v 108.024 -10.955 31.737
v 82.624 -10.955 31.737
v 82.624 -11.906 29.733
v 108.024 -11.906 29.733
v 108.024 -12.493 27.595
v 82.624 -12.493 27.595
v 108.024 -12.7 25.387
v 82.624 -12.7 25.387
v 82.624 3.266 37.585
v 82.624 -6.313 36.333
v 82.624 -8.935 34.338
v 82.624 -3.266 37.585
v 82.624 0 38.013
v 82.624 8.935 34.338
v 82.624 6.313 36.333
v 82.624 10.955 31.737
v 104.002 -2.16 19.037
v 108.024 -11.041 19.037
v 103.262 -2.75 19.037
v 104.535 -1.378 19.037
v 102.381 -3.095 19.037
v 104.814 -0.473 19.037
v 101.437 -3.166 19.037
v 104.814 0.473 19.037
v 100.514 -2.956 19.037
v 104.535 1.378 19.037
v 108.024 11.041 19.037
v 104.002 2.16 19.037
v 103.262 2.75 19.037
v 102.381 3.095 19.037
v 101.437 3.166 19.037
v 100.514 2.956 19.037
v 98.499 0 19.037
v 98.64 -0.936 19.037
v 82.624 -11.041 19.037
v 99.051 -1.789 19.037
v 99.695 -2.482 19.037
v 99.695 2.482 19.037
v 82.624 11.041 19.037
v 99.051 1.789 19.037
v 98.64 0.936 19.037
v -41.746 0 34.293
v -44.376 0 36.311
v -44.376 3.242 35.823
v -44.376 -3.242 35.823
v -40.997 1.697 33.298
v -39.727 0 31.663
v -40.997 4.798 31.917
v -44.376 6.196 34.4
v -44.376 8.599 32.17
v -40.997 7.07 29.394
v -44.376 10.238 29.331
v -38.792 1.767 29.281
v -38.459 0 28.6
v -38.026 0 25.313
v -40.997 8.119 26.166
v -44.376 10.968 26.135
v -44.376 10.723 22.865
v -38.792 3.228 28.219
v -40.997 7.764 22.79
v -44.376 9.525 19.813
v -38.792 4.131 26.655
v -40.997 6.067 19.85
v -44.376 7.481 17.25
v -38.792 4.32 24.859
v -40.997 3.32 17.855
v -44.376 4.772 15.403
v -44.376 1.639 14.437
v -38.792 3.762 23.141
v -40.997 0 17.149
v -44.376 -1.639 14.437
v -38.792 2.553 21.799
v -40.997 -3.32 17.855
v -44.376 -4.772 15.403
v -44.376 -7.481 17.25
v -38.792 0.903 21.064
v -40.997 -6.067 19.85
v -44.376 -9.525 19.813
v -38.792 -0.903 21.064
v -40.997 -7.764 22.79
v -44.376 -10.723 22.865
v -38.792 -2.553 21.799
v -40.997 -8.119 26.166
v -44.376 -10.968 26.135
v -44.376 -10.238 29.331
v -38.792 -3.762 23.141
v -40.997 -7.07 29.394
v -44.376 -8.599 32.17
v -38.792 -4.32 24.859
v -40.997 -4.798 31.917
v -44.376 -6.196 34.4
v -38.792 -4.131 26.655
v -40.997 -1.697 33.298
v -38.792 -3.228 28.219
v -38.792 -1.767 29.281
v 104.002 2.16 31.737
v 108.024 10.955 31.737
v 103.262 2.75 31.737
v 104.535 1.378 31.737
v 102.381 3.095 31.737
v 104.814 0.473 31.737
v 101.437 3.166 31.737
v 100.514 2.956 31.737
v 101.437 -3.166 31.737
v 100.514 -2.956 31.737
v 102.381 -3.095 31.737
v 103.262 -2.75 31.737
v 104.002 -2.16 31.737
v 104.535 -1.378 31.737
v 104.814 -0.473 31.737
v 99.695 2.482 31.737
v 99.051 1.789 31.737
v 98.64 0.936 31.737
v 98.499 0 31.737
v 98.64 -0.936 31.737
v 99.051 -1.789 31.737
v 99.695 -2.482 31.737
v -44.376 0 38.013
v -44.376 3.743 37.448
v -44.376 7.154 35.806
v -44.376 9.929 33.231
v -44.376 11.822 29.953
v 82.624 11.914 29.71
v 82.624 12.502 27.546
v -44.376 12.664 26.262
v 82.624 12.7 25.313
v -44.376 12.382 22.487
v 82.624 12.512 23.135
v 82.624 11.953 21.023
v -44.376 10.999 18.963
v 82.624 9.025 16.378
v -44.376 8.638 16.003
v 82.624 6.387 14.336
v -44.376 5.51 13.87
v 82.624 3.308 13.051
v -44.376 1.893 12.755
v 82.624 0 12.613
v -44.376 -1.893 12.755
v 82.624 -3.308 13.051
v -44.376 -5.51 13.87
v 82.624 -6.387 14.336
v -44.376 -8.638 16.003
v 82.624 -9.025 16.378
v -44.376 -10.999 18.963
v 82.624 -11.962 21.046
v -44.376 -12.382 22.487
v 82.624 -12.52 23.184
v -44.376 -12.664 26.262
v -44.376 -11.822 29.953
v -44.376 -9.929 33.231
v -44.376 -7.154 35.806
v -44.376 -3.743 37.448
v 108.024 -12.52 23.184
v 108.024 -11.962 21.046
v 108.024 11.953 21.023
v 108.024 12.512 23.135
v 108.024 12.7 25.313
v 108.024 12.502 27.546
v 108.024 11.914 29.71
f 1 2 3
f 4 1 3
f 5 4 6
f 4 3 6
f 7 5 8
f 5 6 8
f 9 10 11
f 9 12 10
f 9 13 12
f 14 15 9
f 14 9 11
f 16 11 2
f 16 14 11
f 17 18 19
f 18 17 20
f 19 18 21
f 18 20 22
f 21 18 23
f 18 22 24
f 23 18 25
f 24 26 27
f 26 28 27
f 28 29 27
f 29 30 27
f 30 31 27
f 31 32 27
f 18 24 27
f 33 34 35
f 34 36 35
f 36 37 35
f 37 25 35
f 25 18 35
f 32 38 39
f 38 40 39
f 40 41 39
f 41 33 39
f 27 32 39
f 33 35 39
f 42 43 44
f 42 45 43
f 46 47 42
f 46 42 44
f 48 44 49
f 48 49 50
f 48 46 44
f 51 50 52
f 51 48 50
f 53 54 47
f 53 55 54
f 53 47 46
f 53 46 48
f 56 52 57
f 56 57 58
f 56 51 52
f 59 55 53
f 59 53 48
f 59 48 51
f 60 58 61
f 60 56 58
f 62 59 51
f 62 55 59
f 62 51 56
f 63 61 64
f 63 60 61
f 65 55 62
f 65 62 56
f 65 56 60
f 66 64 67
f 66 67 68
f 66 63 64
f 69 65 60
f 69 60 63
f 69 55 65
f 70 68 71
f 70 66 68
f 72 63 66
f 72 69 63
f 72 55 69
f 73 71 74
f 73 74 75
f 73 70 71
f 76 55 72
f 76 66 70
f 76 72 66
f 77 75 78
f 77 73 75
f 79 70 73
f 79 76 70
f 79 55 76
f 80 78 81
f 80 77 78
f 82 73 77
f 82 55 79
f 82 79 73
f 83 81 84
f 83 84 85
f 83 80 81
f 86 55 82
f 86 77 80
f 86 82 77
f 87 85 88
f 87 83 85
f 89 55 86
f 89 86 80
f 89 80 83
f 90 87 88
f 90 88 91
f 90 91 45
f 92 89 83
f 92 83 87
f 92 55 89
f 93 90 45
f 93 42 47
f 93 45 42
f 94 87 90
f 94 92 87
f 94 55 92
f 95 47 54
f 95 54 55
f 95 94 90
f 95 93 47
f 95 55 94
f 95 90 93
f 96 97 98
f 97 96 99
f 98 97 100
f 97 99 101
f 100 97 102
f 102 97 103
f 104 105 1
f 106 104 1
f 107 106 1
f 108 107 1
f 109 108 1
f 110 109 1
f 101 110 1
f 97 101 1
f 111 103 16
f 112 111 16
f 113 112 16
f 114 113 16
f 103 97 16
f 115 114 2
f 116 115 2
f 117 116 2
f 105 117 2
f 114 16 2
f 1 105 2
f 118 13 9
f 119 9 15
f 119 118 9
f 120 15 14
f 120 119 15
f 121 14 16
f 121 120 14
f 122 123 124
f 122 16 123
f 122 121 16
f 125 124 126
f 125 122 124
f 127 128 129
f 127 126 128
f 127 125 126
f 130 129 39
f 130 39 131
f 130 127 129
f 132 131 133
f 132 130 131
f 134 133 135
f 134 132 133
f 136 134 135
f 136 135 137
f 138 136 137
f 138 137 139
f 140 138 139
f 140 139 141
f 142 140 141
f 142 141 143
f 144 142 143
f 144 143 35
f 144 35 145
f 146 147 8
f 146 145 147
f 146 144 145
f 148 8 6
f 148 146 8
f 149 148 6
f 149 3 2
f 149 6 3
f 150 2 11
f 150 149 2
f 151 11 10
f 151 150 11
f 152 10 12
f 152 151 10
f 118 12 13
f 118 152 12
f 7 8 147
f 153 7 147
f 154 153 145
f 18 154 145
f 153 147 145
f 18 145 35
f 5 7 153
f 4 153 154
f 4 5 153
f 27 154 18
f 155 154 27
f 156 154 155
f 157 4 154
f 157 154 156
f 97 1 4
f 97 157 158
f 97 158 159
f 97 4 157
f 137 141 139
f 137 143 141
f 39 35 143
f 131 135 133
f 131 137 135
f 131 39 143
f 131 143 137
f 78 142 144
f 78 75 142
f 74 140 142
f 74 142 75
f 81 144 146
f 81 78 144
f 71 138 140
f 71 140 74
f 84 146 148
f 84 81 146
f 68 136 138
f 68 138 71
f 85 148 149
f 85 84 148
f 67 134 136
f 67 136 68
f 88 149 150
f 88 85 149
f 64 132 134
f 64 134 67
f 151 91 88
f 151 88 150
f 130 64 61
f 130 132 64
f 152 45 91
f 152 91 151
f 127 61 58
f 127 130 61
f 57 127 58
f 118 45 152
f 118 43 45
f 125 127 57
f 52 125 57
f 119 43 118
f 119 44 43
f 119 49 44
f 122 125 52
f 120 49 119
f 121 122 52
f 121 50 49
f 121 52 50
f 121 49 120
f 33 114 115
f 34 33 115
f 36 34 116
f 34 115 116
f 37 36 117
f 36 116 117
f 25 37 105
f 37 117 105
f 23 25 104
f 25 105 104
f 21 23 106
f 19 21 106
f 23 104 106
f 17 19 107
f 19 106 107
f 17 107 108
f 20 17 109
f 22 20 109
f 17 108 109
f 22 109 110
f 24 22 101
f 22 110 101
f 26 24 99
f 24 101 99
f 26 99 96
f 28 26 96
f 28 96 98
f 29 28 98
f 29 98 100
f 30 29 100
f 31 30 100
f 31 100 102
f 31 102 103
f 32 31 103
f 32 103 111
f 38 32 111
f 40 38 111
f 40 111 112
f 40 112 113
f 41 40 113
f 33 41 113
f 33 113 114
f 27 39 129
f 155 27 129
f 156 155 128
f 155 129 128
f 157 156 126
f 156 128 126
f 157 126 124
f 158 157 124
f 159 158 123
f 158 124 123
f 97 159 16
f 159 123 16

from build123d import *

# Parameters (mm, degrees)
F3_DEPTH = 25.4
F5_D     = 6.35


with BuildPart() as f1:
    # F0 (on Front) → F1 (revolve)
    with BuildSketch(Plane.XZ):
        with BuildLine():
            Line((82.624230206, 38.012702018), (-44.375769794, 38.012702018))
            Line((-44.375769794, 38.012702018), (-44.375769794, 36.3112246461))
            ThreePointArc((-44.375769794, 36.3112246461), (-39.7272471659, 31.662702018), (-38.025769794, 25.312702018))
            Line((-38.025769794, 25.312702018), (82.624230206, 25.312702018))
            Line((82.624230206, 25.312702018), (82.624230206, 31.662702018))
            Line((82.624230206, 31.662702018), (82.624230206, 38.012702018))
        make_face()
    revolve(axis=Axis((15.949230206, 0, 25.312702018), (-1, 0, 0)))

    # F2 (on face) → F3 (join)
    with BuildSketch(Plane.YZ.offset(82.624230206)):
        with BuildLine():
            Line((0, 25.3868182957), (0, 31.7368182957))
            Line((0, 31.7368182957), (-10.9553973023, 31.7368182957))
            ThreePointArc((-10.9553973023, 31.7368182957), (-12.2463268947, 28.6768479108), (-12.6997837296, 25.3868182957))
            Line((-12.6997837296, 25.3868182957), (0, 25.3868182957))
        make_face()
        with BuildLine():
            Line((0, 19.0368182957), (0, 25.3868182957))
            Line((0, 25.3868182957), (-12.6997837296, 25.3868182957))
            ThreePointArc((-12.6997837296, 25.3868182957), (-12.2876610608, 22.1028132887), (-11.0409819991, 19.0368182957))
            Line((-11.0409819991, 19.0368182957), (0, 19.0368182957))
        make_face()
        with BuildLine():
            Line((10.9553973023, 31.7368182957), (0, 31.7368182957))
            Line((0, 31.7368182957), (0, 25.3868182957))
            Line((0, 25.3868182957), (0, 19.0368182957))
            Line((0, 19.0368182957), (11.0409819991, 19.0368182957))
            ThreePointArc((11.0409819991, 19.0368182957), (12.2782423699, 22.0669718527), (12.7, 25.312702018))
            ThreePointArc((12.7, 25.312702018), (12.2560912558, 28.6410990993), (10.9553973023, 31.7368182957))
        make_face()
    extrude(amount=F3_DEPTH)

    # F5 (through all)
    with Locations(Plane(origin=(0, 0, 19.0368182957), x_dir=(1, 0, 0), z_dir=(0, 0, -1))):
        with Locations((101.674230206, 0)):
            Hole(F5_D / 2)


solid = f1.part
